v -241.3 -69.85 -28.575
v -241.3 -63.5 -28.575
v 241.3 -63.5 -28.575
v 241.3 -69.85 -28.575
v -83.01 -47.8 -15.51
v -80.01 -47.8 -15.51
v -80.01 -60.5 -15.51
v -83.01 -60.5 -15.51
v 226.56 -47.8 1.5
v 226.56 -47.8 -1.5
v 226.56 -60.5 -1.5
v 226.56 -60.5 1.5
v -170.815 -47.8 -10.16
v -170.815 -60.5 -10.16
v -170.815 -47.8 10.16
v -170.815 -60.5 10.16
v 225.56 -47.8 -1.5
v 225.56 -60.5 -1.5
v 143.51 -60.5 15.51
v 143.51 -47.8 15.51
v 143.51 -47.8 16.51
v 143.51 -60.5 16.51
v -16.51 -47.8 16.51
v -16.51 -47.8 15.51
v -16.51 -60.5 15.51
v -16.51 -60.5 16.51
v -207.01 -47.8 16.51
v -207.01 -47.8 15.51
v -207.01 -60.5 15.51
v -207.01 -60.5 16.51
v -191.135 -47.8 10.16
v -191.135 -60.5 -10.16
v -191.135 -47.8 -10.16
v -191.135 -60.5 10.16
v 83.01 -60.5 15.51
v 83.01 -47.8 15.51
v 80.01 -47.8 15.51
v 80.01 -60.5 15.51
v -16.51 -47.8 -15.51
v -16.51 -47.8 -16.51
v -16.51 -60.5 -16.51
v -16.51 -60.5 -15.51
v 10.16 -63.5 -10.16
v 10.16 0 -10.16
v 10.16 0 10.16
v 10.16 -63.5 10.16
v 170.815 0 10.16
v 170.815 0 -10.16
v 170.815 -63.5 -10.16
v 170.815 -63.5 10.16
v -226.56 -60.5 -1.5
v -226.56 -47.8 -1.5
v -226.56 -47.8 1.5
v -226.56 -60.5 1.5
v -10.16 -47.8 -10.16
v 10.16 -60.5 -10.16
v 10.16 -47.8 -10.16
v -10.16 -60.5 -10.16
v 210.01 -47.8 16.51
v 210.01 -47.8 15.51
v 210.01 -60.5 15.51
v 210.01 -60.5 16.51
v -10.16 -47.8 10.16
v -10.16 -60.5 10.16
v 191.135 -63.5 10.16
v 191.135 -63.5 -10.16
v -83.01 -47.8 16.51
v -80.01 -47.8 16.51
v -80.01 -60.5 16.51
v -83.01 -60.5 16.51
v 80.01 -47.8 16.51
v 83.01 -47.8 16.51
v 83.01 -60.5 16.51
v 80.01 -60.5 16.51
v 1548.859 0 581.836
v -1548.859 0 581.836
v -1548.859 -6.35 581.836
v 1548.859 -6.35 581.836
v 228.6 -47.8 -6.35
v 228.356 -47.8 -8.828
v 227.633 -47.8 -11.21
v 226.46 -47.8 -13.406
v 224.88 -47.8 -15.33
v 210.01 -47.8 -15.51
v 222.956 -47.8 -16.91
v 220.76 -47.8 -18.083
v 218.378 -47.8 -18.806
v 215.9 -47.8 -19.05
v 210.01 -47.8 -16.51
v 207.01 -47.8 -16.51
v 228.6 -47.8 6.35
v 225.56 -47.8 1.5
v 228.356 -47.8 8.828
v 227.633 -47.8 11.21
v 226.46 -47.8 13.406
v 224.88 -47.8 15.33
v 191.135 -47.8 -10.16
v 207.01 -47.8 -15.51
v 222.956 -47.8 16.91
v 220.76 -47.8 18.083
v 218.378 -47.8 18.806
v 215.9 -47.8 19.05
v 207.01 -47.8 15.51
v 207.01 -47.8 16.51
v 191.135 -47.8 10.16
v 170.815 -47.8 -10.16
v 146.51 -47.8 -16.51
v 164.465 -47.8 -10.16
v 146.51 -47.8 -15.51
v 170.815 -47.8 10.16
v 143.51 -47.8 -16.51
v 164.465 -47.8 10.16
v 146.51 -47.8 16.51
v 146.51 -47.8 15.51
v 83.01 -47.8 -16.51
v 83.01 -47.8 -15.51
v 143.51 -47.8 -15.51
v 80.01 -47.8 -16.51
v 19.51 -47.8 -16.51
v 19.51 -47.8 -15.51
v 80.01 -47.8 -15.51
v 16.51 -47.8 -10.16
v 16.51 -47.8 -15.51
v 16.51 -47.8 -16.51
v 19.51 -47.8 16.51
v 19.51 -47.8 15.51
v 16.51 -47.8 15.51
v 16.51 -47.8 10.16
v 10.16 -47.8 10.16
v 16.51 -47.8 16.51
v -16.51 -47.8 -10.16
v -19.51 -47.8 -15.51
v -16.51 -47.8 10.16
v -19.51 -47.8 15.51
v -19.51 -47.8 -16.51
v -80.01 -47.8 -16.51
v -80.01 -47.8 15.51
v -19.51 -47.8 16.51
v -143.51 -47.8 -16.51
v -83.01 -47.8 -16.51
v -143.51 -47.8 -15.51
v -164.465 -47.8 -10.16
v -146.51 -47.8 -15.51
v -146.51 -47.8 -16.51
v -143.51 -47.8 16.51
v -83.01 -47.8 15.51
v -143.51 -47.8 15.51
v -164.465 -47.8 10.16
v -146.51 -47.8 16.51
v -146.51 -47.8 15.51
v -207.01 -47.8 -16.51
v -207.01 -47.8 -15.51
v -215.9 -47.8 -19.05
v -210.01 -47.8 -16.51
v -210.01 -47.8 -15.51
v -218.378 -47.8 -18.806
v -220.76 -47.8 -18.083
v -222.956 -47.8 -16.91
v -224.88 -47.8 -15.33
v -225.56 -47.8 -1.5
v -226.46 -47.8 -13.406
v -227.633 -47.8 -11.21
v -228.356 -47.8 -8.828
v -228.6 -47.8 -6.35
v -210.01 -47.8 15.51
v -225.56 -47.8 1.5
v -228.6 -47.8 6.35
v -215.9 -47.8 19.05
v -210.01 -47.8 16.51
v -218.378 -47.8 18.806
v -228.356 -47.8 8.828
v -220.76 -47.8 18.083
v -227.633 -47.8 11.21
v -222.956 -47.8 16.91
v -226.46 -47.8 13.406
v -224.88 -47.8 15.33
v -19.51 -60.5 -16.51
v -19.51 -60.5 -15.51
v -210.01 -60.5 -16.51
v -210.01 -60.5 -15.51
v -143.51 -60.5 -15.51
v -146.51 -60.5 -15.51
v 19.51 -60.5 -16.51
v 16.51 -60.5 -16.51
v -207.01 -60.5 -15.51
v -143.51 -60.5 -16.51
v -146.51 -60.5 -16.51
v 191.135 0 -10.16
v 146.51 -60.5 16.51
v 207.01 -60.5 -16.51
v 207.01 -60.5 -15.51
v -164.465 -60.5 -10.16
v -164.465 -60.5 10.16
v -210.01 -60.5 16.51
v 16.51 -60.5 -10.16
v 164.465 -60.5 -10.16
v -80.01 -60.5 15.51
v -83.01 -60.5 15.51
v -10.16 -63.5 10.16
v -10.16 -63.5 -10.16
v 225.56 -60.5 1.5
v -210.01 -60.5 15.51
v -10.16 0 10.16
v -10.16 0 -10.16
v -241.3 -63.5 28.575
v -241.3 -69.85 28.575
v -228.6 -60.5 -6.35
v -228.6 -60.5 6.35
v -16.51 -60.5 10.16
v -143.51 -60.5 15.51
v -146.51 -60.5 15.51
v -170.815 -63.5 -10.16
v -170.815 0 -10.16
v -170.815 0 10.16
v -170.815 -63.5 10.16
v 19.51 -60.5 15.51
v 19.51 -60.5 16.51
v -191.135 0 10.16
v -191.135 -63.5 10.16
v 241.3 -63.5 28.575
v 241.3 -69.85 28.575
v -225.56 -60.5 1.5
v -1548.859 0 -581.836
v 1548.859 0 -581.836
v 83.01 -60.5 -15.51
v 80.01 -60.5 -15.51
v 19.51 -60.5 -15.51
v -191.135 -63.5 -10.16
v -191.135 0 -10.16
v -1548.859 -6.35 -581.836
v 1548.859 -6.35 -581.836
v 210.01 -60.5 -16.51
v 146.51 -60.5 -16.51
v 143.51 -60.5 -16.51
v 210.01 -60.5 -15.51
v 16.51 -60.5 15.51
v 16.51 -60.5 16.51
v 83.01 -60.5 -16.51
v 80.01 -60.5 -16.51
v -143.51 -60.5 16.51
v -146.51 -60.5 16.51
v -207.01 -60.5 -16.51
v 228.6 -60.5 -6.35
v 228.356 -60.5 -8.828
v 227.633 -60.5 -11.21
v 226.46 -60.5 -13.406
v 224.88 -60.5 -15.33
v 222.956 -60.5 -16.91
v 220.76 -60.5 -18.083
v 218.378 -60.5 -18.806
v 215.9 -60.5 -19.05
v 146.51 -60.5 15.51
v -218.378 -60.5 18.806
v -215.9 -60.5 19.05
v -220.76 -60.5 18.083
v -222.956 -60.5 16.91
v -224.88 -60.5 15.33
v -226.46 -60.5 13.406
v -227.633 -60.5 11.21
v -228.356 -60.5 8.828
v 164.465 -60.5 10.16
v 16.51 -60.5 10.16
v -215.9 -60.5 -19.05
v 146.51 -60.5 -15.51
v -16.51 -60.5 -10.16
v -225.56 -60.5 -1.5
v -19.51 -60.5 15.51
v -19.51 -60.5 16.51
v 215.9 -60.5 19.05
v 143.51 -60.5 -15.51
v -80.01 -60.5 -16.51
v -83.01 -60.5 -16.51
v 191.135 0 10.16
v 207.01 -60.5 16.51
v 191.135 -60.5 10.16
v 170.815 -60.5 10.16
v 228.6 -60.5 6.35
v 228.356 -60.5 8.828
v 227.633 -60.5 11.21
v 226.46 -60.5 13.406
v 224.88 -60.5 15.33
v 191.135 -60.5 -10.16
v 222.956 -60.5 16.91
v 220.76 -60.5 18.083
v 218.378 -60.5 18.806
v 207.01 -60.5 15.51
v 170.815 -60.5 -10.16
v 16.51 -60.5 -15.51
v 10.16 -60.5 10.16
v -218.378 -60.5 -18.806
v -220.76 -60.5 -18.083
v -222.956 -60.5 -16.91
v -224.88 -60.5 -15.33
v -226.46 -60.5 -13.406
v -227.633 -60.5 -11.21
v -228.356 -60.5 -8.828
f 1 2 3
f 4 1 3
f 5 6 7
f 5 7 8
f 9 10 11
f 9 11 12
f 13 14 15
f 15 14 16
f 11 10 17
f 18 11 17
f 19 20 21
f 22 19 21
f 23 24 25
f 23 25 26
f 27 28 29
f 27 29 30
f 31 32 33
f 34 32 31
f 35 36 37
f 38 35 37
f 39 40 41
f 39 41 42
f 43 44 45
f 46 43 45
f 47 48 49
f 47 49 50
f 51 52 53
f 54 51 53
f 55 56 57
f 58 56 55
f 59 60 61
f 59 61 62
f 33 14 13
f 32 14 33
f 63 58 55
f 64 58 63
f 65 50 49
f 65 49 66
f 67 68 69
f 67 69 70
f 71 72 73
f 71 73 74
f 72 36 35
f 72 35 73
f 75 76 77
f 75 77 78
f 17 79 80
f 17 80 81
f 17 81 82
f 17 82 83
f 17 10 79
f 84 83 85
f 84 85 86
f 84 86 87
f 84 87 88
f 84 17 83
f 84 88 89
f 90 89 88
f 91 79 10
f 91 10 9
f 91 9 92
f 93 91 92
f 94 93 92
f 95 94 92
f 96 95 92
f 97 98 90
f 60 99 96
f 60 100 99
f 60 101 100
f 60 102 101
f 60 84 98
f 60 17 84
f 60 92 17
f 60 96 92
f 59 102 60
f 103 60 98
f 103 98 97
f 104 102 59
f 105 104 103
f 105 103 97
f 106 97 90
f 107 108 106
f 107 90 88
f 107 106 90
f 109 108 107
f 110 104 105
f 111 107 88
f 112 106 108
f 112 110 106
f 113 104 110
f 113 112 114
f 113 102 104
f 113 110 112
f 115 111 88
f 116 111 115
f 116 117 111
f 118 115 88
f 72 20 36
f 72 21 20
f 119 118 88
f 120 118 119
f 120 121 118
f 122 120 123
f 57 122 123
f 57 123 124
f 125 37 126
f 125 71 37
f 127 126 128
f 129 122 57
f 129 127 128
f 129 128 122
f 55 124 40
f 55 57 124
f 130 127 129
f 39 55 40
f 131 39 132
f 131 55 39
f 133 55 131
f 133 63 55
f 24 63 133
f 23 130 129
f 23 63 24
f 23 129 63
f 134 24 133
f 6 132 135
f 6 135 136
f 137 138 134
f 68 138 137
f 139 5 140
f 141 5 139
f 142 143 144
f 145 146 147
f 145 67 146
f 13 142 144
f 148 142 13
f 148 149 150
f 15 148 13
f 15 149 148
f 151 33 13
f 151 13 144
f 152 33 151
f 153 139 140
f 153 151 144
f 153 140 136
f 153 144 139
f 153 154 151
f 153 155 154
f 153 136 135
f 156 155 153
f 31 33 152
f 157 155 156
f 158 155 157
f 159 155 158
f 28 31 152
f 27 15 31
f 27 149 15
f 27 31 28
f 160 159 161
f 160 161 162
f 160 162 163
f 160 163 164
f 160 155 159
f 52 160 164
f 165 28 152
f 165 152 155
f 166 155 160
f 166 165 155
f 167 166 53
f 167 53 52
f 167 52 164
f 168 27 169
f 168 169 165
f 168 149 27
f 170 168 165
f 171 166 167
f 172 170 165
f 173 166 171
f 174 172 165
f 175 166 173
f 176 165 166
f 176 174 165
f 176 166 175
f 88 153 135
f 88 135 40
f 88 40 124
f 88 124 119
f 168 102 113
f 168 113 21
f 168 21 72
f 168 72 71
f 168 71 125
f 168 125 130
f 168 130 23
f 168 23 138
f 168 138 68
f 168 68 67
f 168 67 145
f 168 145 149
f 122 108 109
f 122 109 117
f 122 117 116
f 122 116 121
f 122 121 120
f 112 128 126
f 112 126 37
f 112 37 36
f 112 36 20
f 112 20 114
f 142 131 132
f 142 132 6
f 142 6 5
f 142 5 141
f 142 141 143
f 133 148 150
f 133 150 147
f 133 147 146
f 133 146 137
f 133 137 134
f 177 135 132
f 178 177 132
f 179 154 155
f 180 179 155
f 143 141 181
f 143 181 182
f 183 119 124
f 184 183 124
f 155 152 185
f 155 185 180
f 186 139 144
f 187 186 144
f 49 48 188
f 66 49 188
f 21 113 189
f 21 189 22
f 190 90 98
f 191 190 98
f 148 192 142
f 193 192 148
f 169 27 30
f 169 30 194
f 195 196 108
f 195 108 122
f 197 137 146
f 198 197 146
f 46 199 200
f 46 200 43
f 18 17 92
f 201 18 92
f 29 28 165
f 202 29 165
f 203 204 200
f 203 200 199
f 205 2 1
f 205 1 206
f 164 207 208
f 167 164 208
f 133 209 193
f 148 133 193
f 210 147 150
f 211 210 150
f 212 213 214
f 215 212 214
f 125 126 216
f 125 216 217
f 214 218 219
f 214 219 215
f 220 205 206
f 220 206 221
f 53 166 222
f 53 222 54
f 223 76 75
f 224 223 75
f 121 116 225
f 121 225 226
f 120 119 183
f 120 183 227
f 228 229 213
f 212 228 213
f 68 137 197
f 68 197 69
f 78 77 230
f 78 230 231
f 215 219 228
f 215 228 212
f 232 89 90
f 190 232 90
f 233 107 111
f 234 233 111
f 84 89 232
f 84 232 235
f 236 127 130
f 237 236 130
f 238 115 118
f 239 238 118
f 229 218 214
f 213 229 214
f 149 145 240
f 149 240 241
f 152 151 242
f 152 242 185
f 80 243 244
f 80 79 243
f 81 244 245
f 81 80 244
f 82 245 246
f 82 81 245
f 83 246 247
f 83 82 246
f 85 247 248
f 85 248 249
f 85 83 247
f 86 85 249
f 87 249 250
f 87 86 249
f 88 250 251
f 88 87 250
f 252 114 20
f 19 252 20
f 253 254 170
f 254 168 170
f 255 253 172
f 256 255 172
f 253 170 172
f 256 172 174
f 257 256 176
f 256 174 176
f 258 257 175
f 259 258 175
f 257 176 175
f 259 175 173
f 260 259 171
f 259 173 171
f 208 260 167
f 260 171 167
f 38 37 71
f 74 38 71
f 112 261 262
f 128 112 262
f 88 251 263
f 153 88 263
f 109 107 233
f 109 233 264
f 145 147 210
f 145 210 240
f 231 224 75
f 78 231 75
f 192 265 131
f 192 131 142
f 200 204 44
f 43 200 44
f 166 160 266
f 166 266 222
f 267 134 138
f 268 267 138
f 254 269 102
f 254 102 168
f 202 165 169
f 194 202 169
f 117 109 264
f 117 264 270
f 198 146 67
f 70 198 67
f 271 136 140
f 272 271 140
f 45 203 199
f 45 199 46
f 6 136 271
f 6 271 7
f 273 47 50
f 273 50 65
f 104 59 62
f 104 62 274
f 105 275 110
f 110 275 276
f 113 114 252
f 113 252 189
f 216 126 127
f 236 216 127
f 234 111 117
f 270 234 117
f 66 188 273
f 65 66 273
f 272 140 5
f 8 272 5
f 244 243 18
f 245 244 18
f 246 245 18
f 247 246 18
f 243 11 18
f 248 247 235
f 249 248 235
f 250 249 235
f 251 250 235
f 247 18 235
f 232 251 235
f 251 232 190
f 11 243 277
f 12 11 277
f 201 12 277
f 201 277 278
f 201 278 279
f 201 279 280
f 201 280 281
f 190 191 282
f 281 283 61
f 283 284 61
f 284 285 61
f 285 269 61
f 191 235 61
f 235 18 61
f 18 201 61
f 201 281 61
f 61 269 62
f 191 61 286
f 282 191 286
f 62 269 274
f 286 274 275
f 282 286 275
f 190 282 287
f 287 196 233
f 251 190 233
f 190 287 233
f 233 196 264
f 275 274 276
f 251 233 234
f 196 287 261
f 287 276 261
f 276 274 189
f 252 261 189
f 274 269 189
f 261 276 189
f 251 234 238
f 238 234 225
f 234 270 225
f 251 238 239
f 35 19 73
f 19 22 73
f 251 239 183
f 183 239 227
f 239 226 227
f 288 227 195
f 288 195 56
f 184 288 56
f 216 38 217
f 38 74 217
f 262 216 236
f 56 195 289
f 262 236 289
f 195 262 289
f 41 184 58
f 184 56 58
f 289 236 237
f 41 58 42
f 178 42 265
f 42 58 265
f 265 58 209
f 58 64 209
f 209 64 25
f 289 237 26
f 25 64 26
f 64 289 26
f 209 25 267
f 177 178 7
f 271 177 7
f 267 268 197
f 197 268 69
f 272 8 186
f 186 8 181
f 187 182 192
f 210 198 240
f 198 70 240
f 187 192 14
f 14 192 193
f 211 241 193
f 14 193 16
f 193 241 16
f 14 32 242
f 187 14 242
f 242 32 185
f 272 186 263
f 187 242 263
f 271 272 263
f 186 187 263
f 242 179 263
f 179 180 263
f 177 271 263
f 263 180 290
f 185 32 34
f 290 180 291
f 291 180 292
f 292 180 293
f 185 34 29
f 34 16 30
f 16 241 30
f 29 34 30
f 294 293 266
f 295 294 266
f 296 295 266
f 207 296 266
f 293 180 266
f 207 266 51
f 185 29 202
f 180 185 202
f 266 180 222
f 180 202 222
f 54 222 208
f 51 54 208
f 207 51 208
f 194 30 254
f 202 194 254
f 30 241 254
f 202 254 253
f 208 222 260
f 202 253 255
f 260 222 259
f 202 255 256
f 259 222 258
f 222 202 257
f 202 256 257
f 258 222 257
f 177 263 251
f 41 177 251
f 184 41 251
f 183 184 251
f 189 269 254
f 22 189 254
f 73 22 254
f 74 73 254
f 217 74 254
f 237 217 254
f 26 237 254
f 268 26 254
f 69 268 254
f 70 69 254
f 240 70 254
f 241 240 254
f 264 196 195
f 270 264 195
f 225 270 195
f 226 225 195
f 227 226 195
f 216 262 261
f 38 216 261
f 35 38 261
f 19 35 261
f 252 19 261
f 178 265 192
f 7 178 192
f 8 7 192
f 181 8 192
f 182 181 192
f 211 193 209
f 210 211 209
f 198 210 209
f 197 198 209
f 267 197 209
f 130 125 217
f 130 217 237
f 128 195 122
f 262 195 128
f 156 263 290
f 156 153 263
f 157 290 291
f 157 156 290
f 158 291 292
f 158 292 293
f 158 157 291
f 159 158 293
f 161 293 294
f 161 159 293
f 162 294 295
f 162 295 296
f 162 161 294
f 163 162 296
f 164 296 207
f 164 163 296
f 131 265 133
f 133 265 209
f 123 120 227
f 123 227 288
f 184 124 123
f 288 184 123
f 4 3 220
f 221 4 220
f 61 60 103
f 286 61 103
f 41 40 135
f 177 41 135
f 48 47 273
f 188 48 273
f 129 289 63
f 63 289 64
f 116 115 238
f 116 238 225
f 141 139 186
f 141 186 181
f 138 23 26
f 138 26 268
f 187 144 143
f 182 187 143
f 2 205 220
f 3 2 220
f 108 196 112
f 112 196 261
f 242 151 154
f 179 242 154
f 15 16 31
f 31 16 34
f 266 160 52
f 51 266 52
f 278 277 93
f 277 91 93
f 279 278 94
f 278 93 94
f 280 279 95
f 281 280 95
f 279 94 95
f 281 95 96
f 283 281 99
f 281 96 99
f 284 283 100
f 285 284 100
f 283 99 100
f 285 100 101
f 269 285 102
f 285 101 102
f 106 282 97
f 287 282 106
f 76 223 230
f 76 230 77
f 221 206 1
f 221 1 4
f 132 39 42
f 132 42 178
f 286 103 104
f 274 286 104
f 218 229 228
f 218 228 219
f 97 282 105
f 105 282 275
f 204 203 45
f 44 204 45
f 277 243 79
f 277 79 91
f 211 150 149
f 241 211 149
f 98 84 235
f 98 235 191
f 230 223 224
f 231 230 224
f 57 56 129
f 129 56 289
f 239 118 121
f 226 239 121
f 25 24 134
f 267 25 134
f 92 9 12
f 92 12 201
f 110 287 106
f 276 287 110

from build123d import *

# Parameters (mm, degrees)
F0_W     = 20.32
F0_H     = 20.32
F1_DEPTH = 63.5
F2_W     = 482.6
F2_H     = 57.15
F3_DEPTH = 6.35
F5_W     = 457.2
F5_H     = 38.1
F5_W_2   = 3
F5_H_2   = 1
F5_W_3   = 1
F5_H_3   = 3
F5_W_4   = 20.32
F5_H_4   = 20.32
F5_W_5   = 147.955
F6_DEPTH = 12.7
F7_R     = 12.7
F8_W     = 3097.7175235748
F8_H     = 1163.6712551117
F9_DEPTH = 6.35


with BuildPart() as f1:
    # F0 (on Front) → F1 (new body)
    with BuildSketch(Plane.XZ):
        Rectangle(F0_W, F0_H)
    extrude(amount=F1_DEPTH)


with BuildPart() as f1b:
    # F0 (on Front) → F1, piece 2 (new body)
    with BuildSketch(Plane.XZ):
        with Locations((180.975, 0)):
            Rectangle(F0_W, F0_H)
    extrude(amount=F1_DEPTH)


with BuildPart() as f1c:
    # F0 (on Front) → F1, piece 3 (new body)
    with BuildSketch(Plane.XZ):
        with Locations((-180.975, 0)):
            Rectangle(F0_W, F0_H)
    extrude(amount=F1_DEPTH)


with BuildPart() as f3:
    # F2 (on face) → F3 (new body)
    with BuildSketch(Plane.XZ.offset(63.5)):
        Rectangle(F2_W, F2_H)
    extrude(amount=F3_DEPTH)


with BuildPart() as f6:
    # F5 (on offset) → F6 (new body)
    with BuildSketch(Plane(origin=(0, -60.5, 0), x_dir=(-1, 0, 0), z_dir=(0, 1, 0))):
        Rectangle(F5_W, F5_H)
        with Locations((-208.51, -16.01)):
            Rectangle(F5_W_2, F5_H_2, mode=Mode.SUBTRACT)
        with Locations((-145.01, -16.01)):
            Rectangle(F5_W_2, F5_H_2, mode=Mode.SUBTRACT)
        with Locations((-81.51, -16.01)):
            Rectangle(F5_W_2, F5_H_2, mode=Mode.SUBTRACT)
        with Locations((-18.01, -16.01)):
            Rectangle(F5_W_2, F5_H_2, mode=Mode.SUBTRACT)
        with Locations((18.01, -16.01)):
            Rectangle(F5_W_2, F5_H_2, mode=Mode.SUBTRACT)
        with Locations((81.51, -16.01)):
            Rectangle(F5_W_2, F5_H_2, mode=Mode.SUBTRACT)
        with Locations((145.01, -16.01)):
            Rectangle(F5_W_2, F5_H_2, mode=Mode.SUBTRACT)
        with Locations((208.51, -16.01)):
            Rectangle(F5_W_2, F5_H_2, mode=Mode.SUBTRACT)
        with Locations((-226.06, 0)):
            Rectangle(F5_W_3, F5_H_3, mode=Mode.SUBTRACT)
        with Locations((-180.975, 0)):
            Rectangle(F5_W_4, F5_H_4, mode=Mode.SUBTRACT)
        with Locations((-90.4875, 0)):
            Rectangle(F5_W_5, F5_H_4, mode=Mode.SUBTRACT)
        with Locations((-208.51, 16.01)):
            Rectangle(F5_W_2, F5_H_2, mode=Mode.SUBTRACT)
        with Locations((-145.01, 16.01)):
            Rectangle(F5_W_2, F5_H_2, mode=Mode.SUBTRACT)
        with Locations((-81.51, 16.01)):
            Rectangle(F5_W_2, F5_H_2, mode=Mode.SUBTRACT)
        with Locations((-18.01, 16.01)):
            Rectangle(F5_W_2, F5_H_2, mode=Mode.SUBTRACT)
        Rectangle(F5_W_4, F5_H_4, mode=Mode.SUBTRACT)
        with Locations((90.4875, 0)):
            Rectangle(F5_W_5, F5_H_4, mode=Mode.SUBTRACT)
        with Locations((180.975, 0)):
            Rectangle(F5_W_4, F5_H_4, mode=Mode.SUBTRACT)
        with Locations((226.06, 0)):
            Rectangle(F5_W_3, F5_H_3, mode=Mode.SUBTRACT)
        with Locations((18.01, 16.01)):
            Rectangle(F5_W_2, F5_H_2, mode=Mode.SUBTRACT)
        with Locations((81.51, 16.01)):
            Rectangle(F5_W_2, F5_H_2, mode=Mode.SUBTRACT)
        with Locations((145.01, 16.01)):
            Rectangle(F5_W_2, F5_H_2, mode=Mode.SUBTRACT)
        with Locations((208.51, 16.01)):
            Rectangle(F5_W_2, F5_H_2, mode=Mode.SUBTRACT)
    extrude(amount=F6_DEPTH)

    # F7
    f7_edges = [f6.edges().sort_by_distance(p)[0] for p in [
        (228.6, -54.15, 19.05),
        (228.6, -54.15, -19.05),
        (-228.6, -54.15, 19.05),
        (-228.6, -54.15, -19.05),
    ]]
    fillet(f7_edges, radius=F7_R)


with BuildPart() as f9:
    # F8 (on Front) → F9 (new body)
    with BuildSketch(Plane.XZ):
        Rectangle(F8_W, F8_H)
    extrude(amount=F9_DEPTH)


solid = Compound([f1.part, f1b.part, f1c.part, f3.part, f6.part, f9.part])
